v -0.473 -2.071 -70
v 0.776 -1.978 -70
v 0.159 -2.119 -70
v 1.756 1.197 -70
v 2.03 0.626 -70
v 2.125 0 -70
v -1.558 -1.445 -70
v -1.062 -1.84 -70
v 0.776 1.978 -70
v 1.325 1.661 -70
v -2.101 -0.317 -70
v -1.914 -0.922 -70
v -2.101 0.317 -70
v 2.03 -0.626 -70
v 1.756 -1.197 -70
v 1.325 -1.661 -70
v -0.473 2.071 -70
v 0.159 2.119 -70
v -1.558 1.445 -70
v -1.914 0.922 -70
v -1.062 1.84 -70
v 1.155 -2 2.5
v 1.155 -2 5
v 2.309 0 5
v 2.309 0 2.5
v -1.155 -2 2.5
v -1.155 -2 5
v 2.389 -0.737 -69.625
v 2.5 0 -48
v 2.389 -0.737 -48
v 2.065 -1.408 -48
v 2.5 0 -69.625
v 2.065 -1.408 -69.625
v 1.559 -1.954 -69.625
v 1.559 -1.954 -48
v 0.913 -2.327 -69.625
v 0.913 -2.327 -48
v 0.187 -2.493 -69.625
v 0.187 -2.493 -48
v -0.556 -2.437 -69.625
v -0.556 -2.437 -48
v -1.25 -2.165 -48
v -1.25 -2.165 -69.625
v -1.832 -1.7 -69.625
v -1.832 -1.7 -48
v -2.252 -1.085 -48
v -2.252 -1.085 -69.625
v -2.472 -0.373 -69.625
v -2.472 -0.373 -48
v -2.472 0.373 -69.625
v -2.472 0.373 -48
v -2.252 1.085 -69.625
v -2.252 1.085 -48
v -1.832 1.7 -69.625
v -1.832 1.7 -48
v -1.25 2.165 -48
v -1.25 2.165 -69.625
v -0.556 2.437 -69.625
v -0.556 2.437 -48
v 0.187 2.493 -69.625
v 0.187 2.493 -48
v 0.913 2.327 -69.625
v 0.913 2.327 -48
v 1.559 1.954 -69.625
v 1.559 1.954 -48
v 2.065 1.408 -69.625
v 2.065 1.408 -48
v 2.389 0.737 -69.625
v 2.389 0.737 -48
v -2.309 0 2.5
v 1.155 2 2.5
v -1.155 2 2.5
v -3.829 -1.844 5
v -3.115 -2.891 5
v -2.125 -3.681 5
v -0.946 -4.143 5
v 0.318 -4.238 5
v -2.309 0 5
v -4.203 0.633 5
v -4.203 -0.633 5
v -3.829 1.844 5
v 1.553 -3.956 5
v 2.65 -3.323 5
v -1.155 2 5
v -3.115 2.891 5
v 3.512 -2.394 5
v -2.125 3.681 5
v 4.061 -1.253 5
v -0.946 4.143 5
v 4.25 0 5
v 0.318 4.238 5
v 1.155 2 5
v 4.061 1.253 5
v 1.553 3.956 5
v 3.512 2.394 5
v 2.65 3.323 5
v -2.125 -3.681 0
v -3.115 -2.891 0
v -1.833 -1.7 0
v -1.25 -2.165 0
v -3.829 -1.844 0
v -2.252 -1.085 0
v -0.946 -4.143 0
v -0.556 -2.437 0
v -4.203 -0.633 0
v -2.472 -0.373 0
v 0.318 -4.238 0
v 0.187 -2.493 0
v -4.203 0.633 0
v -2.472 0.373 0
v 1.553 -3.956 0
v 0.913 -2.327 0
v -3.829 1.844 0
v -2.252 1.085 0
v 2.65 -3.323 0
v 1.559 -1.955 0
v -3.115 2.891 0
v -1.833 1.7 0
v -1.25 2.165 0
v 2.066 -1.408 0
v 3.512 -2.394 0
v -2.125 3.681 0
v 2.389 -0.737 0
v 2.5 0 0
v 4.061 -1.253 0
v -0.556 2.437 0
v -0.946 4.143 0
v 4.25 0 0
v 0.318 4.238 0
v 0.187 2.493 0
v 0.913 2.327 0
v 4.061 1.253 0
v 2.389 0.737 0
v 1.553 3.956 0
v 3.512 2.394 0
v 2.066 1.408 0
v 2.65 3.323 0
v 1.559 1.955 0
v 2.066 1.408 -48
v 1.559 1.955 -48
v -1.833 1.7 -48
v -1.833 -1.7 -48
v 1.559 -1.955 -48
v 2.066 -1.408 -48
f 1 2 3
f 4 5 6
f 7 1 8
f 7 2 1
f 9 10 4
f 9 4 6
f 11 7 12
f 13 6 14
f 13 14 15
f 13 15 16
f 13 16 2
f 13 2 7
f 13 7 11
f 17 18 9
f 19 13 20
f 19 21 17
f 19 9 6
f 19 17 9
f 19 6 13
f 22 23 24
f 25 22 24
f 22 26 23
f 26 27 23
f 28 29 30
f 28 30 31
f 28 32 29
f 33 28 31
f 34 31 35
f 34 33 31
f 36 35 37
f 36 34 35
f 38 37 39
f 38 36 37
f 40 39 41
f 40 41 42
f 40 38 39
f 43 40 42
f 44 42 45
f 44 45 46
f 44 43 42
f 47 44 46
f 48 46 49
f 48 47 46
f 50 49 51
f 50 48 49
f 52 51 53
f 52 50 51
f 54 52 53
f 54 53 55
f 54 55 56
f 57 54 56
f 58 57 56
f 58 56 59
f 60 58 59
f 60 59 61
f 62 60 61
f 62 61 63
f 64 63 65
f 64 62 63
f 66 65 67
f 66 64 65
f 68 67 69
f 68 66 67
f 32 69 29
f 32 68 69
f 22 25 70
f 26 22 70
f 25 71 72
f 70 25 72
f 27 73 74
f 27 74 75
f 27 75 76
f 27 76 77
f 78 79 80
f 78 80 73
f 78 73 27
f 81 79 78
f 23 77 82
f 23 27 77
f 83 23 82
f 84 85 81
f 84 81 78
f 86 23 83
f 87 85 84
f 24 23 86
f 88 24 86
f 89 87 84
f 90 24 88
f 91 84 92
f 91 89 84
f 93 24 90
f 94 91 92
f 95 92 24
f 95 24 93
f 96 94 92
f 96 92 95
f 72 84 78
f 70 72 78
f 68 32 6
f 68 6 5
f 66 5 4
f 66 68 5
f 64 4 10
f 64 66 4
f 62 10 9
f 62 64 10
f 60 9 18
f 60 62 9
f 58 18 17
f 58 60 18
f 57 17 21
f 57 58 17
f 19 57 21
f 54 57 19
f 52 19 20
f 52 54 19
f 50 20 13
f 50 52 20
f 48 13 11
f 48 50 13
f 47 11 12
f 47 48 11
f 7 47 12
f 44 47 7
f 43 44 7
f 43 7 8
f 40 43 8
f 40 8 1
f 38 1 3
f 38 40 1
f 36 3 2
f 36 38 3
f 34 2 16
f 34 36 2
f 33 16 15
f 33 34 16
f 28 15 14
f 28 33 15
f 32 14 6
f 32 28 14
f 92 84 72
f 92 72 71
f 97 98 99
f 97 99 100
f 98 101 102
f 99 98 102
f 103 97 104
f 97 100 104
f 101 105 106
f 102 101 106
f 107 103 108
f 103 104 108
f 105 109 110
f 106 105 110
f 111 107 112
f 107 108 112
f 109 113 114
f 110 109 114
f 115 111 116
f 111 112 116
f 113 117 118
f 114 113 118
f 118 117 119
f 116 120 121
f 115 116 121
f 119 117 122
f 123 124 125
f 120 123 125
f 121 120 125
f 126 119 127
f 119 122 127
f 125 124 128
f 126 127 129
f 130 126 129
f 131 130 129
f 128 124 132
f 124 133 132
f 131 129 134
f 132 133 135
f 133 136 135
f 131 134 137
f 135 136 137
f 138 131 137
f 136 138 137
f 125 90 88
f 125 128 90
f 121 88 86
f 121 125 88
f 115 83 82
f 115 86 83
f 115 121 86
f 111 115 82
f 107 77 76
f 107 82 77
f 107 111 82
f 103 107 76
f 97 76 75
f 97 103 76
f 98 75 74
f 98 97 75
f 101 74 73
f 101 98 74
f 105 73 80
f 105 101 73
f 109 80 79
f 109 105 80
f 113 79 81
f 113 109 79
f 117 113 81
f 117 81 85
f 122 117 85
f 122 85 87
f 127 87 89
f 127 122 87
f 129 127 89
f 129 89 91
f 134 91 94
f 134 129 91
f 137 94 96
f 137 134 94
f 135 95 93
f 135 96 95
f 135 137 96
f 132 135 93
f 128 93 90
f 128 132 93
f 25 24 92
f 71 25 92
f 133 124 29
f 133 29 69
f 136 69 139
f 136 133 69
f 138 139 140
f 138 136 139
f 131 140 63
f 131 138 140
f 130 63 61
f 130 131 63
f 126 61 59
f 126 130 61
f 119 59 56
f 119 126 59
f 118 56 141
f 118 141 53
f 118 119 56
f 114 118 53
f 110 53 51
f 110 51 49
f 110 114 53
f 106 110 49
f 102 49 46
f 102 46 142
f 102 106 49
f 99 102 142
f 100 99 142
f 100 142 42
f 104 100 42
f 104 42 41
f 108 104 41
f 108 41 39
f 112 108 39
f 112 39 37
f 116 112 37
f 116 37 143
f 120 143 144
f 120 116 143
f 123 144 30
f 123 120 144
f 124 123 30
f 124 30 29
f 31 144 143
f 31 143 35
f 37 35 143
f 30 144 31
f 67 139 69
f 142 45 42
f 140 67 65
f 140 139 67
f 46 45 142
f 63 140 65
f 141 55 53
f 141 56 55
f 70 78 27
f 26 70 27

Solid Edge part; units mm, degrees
sketch "Sketch1" plane through (0, 0, 0) normal (0, 0, 1) x (1, 0, 0)
  circle A0 centre (0, 0) radius 4.25
  dimension "D1" = 8.5
extrude "Protrusion1" add sketch "Sketch1" along normal blind 5
sketch "Sketch2" plane through (0, 0, 0) normal (0, 0, -1) x (1, 0, 0)
  circle A0 centre (0, 0) radius 2.5
extrude "Protrusion2" add sketch "Sketch2" along normal blind 70
sketch "Sketch3" plane through (0, 0, -70) normal (0, 0, -1) x (1, 0, 0)
  circle A0 centre (0, 0) radius 2.4997
extrude "Cutout1" cut sketch "Sketch3" against normal blind 22 flip side to cut
chamfer "Chamfer_1" distance 0.375 angle 45 1 edges at (-2.4997, 0, -70)
sketch "Sketch4" plane through (0, 0, 5) normal (0, 0, 1) x (1, 0, 0)
  line L0 (-1.1547, 2) -> (1.1547, 2)
  line L1 (2.3094, 0) -> (1.1547, 2)
  line L2 (1.1547, -2) -> (2.3094, 0)
  line L3 (-1.1547, -2) -> (1.1547, -2)
  line L4 (-2.3094, 0) -> (-1.1547, -2)
  line L5 (-1.1547, 2) -> (-2.3094, 0)
  dimension "D1" = 4
extrude "Cutout2" cut sketch "Sketch4" against normal blind 2.5
properties part number "300282"
